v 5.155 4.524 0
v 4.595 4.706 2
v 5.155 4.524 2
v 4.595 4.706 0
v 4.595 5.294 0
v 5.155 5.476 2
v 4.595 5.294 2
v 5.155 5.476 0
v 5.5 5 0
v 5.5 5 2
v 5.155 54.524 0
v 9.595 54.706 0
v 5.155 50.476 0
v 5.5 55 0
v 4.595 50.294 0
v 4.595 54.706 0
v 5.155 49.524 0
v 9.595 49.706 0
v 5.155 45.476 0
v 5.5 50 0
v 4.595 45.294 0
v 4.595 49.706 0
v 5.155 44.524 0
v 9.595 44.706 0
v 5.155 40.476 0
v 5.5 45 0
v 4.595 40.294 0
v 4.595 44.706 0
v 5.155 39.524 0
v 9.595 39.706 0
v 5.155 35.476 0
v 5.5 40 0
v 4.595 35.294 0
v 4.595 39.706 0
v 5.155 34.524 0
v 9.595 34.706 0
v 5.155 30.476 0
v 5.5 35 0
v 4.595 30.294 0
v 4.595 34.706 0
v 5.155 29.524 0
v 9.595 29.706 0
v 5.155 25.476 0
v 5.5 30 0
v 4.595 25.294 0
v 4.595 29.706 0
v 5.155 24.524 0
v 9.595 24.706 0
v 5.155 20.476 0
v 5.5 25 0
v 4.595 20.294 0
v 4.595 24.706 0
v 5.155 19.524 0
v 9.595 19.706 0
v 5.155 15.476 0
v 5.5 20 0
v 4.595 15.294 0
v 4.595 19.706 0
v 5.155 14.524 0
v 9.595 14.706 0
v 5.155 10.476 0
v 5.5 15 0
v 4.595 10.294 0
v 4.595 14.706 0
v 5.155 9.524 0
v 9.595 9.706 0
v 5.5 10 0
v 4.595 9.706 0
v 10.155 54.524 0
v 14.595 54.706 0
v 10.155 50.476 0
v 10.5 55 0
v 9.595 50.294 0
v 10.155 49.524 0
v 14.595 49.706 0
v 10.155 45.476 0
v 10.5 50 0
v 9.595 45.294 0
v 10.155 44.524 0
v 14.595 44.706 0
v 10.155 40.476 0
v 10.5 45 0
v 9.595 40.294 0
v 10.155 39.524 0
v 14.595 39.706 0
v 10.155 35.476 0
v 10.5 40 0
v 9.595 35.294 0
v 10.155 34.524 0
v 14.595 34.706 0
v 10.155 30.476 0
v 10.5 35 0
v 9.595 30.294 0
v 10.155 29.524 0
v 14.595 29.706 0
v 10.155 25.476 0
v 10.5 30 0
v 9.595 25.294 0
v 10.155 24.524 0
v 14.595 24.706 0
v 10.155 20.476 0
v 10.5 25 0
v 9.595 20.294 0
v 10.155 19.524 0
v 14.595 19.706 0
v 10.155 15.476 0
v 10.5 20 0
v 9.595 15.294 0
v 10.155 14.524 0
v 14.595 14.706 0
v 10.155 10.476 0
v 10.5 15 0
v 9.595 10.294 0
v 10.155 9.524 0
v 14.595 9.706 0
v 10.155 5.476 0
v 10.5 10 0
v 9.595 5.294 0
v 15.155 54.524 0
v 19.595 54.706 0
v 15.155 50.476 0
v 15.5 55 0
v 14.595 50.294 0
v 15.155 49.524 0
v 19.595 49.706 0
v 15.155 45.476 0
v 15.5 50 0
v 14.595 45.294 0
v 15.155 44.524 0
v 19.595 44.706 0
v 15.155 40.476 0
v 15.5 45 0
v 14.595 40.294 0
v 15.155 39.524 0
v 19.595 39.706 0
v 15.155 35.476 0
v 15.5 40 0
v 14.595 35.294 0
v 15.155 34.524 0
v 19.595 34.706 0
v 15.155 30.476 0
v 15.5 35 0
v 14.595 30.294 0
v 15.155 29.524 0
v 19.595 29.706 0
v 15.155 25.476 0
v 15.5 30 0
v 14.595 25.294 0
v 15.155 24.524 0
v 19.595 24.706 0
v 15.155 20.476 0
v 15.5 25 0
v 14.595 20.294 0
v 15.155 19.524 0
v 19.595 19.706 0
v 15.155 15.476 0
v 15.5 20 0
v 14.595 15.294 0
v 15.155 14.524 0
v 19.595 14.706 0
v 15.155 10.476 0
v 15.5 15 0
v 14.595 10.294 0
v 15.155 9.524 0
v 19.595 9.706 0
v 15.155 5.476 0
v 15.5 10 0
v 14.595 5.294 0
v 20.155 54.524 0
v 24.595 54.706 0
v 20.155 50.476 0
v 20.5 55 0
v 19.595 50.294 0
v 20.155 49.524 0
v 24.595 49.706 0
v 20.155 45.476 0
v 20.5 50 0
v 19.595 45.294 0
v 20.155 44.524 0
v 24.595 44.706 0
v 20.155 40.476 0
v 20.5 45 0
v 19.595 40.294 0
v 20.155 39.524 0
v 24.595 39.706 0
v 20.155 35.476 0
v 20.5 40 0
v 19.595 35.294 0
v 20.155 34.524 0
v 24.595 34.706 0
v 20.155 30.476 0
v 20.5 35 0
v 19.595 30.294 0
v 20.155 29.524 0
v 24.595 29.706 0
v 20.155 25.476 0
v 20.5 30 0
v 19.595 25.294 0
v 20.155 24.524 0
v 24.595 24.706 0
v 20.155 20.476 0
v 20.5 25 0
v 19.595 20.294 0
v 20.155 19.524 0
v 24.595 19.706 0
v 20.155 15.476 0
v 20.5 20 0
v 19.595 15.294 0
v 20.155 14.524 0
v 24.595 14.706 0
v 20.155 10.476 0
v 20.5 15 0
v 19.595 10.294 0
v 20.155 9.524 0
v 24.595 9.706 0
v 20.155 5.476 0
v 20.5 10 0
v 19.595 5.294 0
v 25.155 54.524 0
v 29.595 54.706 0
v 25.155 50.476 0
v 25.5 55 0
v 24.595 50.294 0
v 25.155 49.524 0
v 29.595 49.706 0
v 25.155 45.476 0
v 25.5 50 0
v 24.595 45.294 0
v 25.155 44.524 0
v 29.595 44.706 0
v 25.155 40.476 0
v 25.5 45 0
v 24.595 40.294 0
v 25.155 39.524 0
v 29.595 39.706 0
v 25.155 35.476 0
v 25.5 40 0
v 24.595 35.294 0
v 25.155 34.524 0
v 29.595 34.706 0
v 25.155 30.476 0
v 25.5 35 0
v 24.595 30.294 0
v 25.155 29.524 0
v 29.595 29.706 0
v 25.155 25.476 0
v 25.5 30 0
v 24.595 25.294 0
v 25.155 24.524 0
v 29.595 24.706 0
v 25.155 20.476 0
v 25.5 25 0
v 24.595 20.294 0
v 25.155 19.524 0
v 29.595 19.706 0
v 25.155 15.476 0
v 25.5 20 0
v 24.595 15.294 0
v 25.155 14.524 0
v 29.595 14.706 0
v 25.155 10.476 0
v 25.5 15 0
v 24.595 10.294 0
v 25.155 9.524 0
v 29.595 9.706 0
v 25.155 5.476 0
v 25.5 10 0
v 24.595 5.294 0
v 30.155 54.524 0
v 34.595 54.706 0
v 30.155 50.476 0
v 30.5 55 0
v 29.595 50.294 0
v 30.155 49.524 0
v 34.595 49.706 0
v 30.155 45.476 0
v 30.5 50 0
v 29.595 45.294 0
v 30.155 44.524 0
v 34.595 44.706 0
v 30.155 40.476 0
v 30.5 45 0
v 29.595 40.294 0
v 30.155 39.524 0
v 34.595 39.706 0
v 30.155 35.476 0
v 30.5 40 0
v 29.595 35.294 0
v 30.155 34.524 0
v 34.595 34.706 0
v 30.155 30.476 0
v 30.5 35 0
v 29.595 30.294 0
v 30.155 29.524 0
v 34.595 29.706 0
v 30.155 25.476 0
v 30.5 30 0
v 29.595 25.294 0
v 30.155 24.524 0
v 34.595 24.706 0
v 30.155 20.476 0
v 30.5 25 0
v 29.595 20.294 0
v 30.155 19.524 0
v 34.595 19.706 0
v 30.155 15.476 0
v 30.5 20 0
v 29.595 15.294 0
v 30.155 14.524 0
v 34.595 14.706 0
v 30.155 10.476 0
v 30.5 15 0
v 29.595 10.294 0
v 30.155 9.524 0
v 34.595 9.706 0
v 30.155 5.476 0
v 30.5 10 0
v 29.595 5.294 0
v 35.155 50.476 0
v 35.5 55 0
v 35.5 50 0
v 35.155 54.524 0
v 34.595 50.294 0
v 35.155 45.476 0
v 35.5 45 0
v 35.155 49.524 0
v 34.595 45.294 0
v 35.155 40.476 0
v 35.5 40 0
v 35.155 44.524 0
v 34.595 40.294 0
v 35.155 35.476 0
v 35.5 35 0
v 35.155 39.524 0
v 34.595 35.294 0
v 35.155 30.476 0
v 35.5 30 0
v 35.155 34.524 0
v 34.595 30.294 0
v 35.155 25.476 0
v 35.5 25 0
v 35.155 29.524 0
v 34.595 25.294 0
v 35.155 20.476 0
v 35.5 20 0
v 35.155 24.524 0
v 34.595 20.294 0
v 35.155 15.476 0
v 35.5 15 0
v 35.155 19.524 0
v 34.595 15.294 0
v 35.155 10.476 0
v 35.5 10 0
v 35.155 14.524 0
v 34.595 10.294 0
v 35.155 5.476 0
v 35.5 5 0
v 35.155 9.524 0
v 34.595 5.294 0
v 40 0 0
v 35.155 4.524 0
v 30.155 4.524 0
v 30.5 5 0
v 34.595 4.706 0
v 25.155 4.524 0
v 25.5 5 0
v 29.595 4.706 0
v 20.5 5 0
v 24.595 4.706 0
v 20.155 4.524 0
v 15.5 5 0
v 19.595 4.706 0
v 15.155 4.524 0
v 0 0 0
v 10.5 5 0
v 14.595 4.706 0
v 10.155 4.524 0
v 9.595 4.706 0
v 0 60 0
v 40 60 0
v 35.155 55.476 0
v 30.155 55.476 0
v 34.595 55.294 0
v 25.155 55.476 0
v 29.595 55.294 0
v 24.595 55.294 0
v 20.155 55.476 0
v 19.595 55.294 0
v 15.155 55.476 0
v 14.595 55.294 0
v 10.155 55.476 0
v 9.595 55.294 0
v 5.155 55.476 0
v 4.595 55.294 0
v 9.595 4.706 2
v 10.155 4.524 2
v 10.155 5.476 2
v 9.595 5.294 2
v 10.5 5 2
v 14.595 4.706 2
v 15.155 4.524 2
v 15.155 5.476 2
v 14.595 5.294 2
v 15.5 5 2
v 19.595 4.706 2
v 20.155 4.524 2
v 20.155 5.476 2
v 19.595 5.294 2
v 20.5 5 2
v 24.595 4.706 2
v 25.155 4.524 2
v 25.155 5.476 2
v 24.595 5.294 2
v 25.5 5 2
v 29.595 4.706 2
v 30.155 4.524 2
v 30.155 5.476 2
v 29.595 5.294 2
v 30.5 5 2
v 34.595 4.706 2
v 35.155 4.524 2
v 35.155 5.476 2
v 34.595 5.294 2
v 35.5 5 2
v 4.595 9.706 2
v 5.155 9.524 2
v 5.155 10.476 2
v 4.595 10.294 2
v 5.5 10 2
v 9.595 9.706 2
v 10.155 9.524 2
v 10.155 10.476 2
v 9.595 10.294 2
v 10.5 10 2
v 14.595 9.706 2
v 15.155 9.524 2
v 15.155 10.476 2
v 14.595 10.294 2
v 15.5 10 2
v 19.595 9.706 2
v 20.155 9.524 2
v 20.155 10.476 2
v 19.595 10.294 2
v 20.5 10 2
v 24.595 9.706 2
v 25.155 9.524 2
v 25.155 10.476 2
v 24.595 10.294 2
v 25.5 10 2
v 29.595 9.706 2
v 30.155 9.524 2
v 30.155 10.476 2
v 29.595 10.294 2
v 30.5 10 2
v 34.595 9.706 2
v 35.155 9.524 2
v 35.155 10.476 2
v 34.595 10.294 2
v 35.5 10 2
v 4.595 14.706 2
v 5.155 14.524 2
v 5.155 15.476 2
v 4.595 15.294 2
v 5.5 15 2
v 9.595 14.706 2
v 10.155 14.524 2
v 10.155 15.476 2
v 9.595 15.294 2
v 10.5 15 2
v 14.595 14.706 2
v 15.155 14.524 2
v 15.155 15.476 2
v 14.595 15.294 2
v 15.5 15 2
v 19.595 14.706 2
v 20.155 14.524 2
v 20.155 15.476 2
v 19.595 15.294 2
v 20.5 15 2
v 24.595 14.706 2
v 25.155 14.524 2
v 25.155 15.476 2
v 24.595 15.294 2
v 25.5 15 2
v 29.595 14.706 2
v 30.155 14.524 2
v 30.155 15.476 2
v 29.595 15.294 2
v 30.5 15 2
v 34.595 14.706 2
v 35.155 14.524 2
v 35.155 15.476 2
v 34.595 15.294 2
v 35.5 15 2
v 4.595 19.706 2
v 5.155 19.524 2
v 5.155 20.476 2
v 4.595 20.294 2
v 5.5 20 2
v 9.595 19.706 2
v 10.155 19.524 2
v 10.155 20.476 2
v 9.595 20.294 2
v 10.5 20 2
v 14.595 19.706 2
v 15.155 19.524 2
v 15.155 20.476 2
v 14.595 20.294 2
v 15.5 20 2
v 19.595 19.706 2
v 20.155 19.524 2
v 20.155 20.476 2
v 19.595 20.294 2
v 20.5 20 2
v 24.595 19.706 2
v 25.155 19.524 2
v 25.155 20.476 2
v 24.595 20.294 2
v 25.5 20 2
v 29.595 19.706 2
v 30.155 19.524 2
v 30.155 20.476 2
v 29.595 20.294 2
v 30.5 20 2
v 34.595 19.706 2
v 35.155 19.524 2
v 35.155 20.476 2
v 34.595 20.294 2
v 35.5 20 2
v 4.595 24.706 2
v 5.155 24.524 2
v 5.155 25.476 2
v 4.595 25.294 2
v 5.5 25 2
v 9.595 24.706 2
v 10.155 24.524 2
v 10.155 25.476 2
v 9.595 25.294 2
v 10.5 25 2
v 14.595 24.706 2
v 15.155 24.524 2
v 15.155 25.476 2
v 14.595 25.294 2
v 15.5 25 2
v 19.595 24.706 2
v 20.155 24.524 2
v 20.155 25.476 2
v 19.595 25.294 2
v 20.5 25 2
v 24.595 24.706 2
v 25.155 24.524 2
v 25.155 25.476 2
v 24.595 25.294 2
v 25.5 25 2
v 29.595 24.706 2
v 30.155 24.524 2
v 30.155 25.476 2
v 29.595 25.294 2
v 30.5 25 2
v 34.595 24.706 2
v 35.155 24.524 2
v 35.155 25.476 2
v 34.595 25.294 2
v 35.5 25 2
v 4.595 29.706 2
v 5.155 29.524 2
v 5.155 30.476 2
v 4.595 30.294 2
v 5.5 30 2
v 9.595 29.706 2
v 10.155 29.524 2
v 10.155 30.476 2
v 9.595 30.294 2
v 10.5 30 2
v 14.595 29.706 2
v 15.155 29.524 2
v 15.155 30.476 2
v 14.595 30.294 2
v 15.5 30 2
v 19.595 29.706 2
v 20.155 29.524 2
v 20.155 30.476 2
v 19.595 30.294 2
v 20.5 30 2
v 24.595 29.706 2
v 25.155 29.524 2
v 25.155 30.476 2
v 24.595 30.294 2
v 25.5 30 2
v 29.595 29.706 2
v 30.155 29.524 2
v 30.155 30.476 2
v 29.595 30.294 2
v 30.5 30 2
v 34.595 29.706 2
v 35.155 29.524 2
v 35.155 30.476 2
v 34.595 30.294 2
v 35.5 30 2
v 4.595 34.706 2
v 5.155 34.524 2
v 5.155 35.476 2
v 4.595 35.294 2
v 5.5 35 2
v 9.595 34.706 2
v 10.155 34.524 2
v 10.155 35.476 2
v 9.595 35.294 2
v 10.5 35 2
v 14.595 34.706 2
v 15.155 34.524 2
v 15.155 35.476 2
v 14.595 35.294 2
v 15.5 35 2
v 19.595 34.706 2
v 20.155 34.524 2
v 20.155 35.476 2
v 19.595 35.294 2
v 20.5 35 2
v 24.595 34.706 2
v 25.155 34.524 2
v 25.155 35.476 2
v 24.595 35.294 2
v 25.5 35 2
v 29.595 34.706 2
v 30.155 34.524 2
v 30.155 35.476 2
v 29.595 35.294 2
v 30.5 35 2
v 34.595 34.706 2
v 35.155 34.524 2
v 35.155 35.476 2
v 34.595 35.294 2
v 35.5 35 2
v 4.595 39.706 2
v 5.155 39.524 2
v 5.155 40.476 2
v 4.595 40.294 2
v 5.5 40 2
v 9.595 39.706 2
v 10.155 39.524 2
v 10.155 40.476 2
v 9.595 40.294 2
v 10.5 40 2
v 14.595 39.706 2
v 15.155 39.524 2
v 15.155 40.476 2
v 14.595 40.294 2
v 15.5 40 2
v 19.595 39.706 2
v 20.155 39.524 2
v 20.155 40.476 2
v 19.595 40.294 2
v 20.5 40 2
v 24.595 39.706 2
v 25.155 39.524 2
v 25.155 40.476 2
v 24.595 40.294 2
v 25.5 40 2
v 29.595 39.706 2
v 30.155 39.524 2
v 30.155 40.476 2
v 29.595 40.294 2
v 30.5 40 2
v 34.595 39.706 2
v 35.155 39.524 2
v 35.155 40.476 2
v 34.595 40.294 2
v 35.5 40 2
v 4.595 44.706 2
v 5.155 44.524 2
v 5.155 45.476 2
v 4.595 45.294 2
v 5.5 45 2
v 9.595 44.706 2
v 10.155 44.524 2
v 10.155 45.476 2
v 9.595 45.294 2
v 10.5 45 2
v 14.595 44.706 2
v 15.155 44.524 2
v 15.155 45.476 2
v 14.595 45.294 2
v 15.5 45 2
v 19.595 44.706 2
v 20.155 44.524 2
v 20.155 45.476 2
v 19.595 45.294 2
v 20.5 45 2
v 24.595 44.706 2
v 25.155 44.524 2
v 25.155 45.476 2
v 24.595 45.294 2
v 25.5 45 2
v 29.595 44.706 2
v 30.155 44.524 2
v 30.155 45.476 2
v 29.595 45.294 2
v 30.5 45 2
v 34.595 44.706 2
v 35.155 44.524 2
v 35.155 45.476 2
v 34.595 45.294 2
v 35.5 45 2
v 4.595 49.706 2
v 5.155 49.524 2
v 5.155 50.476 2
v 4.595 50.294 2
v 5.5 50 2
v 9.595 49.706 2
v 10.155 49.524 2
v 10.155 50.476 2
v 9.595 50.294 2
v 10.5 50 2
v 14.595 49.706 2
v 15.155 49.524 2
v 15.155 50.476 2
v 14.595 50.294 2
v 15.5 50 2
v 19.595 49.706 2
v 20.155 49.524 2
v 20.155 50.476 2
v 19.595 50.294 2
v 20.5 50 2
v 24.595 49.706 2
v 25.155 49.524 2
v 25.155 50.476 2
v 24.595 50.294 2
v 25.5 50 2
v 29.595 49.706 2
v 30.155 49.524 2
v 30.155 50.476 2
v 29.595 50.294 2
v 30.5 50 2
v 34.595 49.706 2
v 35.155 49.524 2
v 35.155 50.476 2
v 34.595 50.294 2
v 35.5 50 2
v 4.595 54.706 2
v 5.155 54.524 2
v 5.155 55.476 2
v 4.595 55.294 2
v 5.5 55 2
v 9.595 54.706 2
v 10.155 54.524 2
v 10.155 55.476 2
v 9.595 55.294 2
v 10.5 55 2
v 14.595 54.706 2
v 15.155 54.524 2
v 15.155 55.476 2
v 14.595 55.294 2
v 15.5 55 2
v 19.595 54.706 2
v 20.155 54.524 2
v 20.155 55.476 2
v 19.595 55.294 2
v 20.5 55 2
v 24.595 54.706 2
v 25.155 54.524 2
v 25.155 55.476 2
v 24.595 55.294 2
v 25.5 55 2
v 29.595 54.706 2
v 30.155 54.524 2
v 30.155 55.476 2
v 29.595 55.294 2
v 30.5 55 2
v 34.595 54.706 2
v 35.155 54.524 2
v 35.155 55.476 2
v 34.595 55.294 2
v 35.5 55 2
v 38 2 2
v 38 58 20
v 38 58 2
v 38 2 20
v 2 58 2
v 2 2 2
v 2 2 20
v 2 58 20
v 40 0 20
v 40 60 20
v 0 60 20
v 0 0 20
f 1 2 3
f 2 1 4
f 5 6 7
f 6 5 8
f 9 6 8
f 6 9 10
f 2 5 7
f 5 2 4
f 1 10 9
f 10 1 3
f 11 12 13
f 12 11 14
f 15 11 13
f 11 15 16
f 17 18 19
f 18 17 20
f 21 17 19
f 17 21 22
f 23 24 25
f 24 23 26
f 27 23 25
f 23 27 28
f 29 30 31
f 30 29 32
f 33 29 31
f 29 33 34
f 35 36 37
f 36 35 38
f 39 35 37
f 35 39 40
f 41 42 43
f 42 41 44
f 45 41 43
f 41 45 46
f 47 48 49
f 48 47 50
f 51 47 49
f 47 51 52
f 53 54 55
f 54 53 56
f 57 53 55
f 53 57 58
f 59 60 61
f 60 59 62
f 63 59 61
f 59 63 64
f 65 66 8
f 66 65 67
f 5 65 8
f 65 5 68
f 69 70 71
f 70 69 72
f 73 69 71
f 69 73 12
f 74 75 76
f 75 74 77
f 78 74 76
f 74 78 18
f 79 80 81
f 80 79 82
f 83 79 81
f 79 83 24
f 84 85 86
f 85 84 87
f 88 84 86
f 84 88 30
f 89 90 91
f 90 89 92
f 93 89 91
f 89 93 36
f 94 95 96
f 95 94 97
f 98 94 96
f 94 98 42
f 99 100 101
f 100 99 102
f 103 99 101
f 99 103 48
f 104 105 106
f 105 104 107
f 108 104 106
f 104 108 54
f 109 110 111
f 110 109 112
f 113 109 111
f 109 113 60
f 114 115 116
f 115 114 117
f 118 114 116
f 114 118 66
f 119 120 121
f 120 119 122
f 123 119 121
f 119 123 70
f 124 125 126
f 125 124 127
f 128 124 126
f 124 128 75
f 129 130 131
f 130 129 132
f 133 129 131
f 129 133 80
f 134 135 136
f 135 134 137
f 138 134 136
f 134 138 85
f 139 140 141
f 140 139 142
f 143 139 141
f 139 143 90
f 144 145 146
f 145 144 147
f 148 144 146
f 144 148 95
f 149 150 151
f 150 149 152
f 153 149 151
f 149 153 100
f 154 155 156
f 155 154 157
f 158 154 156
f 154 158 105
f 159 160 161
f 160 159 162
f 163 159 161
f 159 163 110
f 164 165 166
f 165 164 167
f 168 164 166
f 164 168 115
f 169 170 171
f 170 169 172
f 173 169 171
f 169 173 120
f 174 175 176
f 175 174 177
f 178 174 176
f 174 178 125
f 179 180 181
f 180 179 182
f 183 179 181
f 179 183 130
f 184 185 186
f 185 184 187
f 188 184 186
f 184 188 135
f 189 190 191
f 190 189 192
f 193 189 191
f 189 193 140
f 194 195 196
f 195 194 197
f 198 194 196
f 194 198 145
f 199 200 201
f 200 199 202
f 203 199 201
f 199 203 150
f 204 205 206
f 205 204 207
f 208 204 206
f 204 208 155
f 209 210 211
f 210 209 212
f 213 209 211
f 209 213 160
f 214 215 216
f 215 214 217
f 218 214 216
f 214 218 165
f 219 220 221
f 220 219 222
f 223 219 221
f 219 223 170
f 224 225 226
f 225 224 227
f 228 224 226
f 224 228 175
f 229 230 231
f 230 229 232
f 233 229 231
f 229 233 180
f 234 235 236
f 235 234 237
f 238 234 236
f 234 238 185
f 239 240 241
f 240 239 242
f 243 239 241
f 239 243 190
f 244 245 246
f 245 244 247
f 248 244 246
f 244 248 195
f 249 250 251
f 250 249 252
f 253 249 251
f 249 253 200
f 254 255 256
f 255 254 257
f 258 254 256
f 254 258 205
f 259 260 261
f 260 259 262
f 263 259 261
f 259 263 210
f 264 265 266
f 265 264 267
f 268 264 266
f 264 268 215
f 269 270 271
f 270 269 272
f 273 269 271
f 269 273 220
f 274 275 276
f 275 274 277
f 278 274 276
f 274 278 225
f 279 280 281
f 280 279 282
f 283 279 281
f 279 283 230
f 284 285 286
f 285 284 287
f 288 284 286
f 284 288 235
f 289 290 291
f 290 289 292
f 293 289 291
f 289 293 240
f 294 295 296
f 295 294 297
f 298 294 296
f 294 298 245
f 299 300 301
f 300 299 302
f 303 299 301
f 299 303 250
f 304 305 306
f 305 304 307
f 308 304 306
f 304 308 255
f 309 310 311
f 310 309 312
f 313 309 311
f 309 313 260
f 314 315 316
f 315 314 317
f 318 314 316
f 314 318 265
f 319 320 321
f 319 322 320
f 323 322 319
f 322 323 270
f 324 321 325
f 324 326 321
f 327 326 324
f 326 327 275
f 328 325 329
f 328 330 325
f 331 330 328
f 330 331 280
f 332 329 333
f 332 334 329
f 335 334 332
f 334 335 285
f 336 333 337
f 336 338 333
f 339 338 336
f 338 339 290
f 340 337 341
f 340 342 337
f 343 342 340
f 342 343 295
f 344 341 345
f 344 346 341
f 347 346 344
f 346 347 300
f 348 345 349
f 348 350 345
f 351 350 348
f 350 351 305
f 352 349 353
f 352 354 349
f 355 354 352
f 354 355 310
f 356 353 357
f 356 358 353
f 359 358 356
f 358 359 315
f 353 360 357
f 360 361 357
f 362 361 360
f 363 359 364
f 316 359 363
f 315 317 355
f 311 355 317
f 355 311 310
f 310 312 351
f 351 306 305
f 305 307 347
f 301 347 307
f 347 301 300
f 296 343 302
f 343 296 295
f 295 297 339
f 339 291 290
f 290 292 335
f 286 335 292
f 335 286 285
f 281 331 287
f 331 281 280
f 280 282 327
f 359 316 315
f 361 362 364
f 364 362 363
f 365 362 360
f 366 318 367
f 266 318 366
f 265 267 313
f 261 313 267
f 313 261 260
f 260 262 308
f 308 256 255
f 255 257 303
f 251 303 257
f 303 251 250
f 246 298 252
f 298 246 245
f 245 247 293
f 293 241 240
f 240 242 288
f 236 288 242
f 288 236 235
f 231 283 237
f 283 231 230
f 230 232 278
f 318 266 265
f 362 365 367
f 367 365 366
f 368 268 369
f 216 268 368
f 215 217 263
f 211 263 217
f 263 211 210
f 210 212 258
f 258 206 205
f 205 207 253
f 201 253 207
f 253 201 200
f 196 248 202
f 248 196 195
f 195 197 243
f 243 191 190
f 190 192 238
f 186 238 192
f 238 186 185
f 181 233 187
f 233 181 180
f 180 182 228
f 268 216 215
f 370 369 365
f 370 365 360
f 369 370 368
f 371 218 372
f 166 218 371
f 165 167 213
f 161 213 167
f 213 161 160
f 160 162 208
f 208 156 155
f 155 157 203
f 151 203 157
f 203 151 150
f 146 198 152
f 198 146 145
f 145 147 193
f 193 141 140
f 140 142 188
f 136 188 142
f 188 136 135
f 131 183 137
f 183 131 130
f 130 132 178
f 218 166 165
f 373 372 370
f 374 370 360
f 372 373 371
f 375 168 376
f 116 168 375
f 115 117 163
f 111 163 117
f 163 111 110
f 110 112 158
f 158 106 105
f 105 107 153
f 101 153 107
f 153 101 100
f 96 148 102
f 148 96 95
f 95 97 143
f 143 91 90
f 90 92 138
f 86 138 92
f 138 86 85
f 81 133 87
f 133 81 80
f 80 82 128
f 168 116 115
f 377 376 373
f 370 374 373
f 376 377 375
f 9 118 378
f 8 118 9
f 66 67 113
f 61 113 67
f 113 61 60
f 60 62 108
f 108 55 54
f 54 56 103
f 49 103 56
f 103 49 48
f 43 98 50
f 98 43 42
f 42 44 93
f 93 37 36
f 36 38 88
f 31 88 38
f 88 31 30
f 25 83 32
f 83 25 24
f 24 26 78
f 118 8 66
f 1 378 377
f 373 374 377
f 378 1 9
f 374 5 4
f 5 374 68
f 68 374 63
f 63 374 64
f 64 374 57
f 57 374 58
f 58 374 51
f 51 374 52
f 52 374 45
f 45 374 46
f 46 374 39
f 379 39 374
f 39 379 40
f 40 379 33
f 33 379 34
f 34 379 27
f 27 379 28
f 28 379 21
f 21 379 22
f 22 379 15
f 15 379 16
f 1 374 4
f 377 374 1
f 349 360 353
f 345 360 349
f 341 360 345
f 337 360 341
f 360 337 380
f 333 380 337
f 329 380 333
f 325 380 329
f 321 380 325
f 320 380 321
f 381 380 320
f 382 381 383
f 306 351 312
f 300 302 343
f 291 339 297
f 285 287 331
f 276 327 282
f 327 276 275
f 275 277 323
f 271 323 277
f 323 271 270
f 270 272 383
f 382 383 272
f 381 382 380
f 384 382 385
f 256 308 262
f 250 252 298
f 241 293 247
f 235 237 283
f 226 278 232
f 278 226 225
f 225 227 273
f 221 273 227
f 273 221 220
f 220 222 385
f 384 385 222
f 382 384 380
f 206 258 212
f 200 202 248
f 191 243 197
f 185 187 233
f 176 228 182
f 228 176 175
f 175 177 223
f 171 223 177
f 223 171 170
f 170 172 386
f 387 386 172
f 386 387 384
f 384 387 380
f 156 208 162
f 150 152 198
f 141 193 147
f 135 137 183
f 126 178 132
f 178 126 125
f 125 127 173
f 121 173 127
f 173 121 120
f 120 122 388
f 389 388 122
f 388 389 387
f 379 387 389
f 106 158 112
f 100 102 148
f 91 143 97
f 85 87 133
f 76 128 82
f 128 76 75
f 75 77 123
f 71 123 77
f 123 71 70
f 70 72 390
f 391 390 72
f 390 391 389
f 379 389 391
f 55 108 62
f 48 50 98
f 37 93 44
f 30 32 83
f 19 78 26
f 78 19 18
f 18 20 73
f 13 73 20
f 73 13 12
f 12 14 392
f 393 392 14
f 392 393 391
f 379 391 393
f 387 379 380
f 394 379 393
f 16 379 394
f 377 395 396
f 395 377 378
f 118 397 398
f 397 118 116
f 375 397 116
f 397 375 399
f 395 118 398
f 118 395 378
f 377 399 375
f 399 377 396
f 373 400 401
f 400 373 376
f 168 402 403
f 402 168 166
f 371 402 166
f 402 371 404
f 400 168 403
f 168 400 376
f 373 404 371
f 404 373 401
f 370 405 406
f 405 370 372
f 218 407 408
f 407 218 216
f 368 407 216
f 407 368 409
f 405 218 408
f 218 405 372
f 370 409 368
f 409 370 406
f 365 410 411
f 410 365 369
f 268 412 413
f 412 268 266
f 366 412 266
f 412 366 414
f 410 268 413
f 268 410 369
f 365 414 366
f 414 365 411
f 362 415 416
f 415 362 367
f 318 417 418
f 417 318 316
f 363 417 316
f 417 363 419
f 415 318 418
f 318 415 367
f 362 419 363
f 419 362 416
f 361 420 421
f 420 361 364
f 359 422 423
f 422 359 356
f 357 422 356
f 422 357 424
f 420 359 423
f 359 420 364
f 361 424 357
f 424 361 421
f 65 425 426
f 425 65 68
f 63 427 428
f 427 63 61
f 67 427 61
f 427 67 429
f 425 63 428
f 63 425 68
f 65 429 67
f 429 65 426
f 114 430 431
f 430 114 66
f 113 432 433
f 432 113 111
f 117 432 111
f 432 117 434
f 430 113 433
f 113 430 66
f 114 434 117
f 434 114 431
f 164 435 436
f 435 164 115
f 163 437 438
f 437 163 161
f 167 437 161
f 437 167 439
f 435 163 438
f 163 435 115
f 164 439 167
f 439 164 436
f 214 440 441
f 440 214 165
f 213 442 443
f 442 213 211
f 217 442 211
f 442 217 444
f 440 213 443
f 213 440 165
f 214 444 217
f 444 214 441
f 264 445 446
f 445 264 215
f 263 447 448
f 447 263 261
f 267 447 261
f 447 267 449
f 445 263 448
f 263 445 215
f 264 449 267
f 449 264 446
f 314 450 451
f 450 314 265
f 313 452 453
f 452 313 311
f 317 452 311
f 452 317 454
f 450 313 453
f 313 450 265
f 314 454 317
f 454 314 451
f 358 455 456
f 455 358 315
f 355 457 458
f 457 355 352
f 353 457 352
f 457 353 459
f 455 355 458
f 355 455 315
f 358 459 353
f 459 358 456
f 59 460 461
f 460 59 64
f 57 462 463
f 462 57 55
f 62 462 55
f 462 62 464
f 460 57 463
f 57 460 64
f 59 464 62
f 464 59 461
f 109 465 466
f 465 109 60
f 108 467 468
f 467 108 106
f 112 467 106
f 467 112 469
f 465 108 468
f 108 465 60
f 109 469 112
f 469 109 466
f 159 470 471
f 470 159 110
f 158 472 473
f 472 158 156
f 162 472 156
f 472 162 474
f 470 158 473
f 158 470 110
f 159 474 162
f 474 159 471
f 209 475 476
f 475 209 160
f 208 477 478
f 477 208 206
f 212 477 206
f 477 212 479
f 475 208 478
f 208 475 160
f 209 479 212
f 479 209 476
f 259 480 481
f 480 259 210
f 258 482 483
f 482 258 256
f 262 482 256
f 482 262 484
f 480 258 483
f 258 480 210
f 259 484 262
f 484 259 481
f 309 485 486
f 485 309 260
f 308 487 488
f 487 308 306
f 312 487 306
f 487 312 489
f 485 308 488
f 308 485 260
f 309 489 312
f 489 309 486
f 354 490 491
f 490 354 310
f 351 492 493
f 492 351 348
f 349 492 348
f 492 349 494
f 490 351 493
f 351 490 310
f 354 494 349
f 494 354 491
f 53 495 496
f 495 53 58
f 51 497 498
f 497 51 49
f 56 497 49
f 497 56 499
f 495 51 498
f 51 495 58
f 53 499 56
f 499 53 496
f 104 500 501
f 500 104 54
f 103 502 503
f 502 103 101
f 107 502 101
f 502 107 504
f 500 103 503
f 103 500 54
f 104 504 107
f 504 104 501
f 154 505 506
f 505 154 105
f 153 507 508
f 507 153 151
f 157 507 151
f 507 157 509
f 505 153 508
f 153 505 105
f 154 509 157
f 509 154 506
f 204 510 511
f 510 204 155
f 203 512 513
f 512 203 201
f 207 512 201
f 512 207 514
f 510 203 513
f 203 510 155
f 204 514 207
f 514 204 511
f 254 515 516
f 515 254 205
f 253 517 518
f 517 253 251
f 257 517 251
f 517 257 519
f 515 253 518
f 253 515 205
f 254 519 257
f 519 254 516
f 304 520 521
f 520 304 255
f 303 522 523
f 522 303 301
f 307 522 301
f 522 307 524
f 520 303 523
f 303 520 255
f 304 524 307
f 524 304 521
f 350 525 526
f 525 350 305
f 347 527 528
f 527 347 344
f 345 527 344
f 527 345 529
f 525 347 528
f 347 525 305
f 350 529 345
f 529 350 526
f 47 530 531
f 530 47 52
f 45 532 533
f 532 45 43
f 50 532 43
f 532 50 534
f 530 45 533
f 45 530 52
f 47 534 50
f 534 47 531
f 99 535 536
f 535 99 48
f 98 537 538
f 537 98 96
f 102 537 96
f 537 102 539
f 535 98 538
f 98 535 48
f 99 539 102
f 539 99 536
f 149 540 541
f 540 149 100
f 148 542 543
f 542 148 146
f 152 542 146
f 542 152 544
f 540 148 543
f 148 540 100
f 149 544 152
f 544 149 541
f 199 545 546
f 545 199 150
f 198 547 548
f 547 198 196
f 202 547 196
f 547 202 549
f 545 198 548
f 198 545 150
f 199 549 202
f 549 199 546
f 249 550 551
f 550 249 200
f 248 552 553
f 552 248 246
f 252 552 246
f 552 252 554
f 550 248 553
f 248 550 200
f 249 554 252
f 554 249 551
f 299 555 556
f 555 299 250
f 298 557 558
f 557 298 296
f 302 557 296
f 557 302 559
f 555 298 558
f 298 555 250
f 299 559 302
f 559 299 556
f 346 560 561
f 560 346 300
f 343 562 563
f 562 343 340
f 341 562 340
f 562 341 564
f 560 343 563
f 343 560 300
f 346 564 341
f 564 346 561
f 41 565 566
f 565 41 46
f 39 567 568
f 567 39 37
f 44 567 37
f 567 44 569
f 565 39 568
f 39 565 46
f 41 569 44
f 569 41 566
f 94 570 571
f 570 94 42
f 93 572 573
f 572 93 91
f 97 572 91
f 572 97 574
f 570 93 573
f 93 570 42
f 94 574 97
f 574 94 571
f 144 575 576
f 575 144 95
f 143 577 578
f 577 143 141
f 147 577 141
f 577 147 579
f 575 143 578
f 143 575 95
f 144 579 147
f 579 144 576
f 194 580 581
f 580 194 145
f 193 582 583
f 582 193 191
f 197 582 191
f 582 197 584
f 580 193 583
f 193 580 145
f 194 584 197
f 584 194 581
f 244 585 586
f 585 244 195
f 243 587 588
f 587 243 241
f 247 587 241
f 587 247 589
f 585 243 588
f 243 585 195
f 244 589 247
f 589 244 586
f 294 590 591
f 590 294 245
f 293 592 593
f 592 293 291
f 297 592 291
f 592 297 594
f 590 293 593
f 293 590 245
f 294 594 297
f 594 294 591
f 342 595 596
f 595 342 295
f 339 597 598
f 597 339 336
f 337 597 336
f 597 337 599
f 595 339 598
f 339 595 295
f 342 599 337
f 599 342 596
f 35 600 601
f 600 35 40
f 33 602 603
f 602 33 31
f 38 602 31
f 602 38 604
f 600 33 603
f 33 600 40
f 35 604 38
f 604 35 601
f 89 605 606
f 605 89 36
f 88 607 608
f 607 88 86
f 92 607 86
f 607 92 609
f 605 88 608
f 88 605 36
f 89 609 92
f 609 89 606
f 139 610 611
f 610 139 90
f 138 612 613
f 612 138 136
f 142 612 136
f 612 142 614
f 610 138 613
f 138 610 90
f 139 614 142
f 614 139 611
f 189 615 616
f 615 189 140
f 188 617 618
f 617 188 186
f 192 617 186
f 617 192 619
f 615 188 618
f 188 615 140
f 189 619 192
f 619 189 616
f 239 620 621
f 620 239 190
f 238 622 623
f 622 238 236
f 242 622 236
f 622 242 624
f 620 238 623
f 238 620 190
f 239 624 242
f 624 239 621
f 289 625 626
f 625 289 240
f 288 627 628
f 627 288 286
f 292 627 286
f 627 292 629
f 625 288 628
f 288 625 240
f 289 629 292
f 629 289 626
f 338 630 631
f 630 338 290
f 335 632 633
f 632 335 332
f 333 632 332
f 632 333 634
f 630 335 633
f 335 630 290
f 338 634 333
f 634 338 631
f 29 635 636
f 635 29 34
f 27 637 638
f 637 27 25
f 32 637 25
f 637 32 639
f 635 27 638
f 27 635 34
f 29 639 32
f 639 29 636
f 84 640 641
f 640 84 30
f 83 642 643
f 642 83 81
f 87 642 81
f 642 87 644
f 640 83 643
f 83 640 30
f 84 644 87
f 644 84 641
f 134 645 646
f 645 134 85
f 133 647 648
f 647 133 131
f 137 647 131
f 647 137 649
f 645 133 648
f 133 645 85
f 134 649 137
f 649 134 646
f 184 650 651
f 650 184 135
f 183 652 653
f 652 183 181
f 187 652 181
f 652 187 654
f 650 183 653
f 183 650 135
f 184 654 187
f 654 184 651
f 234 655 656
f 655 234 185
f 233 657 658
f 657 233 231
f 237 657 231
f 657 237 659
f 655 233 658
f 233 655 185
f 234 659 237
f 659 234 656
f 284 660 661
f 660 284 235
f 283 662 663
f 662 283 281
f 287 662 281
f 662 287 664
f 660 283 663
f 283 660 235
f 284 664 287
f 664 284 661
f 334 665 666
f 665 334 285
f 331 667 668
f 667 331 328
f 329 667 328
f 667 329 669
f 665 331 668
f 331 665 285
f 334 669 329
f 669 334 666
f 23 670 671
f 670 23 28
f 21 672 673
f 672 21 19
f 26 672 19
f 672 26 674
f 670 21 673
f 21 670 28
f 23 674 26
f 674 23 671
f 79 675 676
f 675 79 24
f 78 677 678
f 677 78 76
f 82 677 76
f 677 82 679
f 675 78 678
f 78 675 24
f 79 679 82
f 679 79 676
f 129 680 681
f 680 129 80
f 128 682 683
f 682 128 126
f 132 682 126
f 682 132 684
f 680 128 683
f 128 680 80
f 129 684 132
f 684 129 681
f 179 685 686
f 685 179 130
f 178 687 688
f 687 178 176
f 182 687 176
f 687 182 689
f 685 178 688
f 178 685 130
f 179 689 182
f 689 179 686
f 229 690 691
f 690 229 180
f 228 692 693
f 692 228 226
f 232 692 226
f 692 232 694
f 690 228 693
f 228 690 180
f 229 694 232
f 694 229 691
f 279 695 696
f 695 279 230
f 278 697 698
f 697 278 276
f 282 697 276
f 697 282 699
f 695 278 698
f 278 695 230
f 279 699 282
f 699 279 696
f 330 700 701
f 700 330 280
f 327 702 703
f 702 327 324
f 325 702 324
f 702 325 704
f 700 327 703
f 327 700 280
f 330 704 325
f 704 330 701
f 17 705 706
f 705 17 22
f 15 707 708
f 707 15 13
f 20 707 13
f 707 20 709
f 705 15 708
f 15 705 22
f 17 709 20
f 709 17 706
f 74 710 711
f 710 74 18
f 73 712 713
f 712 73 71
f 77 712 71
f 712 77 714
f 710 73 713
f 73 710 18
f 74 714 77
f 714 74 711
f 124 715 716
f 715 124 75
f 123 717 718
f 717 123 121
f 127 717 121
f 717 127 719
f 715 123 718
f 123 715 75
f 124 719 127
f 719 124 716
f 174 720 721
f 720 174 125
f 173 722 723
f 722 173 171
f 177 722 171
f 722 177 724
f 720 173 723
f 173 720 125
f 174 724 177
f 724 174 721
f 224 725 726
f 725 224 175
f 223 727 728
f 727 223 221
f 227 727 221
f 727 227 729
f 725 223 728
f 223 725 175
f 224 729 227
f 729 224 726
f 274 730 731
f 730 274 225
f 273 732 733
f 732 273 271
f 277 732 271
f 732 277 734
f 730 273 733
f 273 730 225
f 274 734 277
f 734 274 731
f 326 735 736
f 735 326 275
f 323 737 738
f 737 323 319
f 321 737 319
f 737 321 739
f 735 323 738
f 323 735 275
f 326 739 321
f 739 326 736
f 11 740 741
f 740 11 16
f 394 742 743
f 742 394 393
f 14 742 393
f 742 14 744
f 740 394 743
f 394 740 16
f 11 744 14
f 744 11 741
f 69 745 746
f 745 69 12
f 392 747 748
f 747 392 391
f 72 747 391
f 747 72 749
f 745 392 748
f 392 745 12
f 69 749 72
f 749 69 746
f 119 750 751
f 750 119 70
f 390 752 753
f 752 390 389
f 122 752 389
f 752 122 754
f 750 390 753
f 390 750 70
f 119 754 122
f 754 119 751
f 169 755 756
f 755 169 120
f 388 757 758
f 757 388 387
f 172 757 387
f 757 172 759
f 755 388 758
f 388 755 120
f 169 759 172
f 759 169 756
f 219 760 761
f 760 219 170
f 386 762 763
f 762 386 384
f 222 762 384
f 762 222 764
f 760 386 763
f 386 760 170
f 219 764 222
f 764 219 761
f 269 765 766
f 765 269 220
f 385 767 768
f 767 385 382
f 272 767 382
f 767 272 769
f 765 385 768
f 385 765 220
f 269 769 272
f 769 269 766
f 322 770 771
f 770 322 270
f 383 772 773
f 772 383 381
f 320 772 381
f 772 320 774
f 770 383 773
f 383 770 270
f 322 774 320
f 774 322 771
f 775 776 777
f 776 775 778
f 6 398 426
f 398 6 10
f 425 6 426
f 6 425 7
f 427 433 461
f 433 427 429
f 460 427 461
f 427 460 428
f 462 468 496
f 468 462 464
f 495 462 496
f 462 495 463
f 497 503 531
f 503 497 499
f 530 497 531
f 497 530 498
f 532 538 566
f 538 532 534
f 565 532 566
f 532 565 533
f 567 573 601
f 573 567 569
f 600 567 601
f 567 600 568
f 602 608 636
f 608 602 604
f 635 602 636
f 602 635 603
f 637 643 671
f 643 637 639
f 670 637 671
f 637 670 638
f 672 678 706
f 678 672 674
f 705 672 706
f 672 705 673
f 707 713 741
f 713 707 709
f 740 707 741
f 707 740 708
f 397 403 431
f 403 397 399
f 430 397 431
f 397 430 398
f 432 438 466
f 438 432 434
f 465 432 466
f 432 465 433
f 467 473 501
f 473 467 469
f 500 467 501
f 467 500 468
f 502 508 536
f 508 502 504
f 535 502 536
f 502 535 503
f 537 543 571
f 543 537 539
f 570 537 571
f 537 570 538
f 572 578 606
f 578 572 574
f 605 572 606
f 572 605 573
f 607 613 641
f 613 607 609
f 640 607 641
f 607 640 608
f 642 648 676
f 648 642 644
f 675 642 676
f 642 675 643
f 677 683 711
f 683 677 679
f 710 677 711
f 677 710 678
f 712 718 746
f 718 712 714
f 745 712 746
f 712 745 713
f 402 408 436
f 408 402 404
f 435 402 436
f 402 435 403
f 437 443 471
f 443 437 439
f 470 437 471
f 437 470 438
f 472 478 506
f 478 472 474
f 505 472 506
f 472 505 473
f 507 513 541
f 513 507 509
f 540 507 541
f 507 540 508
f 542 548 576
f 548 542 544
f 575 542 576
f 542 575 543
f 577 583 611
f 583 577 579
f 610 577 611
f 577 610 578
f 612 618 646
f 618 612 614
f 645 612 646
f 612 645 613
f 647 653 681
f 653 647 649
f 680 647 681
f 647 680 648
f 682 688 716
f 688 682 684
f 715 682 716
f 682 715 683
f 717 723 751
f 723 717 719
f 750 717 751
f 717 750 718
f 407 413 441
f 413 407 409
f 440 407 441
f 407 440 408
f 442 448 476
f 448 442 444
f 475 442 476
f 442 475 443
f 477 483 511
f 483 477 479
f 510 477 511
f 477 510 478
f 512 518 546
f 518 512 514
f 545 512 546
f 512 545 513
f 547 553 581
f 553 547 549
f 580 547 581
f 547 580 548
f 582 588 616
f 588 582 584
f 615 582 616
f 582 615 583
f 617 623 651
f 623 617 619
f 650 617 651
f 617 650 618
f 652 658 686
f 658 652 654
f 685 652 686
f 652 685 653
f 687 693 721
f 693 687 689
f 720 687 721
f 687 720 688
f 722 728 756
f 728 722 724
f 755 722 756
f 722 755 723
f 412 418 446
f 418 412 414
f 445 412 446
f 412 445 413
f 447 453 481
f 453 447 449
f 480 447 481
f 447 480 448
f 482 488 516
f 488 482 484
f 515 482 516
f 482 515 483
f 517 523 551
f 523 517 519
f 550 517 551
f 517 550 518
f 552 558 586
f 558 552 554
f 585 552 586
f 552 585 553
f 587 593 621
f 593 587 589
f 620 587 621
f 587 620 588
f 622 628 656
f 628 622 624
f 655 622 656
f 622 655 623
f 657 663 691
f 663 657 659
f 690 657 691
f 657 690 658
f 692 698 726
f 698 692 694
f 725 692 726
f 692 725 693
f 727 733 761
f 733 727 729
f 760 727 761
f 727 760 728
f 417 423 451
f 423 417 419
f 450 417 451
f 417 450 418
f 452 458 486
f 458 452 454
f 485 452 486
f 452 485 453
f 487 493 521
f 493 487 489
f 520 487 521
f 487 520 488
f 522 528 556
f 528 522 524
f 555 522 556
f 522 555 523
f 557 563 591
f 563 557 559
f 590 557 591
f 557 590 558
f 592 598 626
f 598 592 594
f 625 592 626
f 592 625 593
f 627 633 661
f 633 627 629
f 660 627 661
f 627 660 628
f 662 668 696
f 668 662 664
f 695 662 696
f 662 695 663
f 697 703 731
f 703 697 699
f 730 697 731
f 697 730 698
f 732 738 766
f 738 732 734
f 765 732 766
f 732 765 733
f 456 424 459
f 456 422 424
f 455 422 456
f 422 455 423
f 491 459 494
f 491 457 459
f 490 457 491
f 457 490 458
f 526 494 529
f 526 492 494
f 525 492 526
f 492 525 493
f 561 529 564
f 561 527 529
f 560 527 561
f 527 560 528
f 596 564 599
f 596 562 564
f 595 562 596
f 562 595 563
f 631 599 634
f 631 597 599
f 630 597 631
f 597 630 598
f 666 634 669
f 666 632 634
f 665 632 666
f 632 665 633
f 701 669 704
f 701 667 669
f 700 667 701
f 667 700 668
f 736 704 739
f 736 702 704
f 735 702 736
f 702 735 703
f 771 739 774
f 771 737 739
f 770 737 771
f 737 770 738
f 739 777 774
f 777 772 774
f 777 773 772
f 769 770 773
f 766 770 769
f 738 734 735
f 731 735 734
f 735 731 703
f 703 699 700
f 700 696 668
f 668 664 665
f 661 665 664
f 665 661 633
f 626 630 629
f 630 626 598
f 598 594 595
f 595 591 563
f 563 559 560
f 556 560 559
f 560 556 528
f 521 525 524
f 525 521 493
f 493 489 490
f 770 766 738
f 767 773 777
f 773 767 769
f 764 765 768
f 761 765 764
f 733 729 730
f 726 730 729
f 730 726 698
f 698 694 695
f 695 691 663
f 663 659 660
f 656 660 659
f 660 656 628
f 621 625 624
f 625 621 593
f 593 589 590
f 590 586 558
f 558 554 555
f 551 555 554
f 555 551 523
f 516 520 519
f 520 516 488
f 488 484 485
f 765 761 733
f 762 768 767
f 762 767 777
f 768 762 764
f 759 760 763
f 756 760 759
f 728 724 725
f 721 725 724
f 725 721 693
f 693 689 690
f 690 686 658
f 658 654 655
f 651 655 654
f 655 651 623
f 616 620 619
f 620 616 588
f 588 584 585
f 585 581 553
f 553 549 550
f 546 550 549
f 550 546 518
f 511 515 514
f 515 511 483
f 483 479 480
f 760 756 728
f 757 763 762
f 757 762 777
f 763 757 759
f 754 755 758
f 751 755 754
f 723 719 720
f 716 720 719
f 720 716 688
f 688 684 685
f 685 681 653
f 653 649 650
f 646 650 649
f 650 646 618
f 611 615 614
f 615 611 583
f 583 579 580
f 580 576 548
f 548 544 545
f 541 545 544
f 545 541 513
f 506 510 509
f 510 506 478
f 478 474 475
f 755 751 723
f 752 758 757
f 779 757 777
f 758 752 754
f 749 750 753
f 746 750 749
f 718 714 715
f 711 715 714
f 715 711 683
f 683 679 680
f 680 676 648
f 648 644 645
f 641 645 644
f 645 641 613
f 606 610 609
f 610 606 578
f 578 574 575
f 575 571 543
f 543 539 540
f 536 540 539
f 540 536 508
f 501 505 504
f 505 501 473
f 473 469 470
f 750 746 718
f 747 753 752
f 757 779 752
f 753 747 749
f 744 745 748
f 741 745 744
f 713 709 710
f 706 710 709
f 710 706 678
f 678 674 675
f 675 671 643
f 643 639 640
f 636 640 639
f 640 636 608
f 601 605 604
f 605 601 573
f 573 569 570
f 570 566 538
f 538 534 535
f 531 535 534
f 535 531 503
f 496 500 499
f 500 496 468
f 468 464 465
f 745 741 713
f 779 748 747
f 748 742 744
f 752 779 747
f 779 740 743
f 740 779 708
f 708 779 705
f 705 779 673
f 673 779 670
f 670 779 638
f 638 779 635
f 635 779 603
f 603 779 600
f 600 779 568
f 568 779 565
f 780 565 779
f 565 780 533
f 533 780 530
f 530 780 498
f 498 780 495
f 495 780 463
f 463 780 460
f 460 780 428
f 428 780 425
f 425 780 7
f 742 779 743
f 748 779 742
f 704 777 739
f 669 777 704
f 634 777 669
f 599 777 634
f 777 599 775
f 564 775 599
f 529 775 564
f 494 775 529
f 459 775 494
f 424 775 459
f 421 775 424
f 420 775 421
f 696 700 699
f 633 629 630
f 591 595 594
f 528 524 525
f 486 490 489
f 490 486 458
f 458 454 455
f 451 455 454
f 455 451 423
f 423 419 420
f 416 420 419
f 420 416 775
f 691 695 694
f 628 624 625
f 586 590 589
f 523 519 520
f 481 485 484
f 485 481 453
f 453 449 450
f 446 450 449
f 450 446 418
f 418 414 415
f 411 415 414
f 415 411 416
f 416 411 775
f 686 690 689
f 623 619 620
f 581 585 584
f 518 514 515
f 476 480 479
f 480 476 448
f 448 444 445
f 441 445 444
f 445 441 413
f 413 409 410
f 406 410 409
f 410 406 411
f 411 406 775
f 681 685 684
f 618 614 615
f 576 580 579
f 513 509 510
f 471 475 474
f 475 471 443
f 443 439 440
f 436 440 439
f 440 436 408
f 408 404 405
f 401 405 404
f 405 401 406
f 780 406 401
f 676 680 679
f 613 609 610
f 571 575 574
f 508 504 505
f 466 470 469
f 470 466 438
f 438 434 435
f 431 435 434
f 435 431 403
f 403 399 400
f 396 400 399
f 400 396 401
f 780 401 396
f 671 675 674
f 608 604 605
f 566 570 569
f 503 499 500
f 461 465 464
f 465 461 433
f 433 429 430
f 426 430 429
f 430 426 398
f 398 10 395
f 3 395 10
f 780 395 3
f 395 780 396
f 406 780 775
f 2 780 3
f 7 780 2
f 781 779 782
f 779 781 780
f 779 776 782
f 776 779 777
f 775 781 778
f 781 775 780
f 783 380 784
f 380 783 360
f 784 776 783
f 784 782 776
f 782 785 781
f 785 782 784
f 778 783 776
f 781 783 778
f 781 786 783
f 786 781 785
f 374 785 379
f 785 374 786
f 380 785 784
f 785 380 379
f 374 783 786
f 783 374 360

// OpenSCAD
//width (in mm)
width = 40;

//length
length = 60;

//height
height = 20;

//wall thickness
wall = 2;

//pitch (hole spacing)
pitch = 5;

module pbox(w,l,h,wall,pitch){
    difference(){
        cube([w,l,h]);
        union(){
            translate([wall,wall,wall]) cube([w-2*wall,l-2*wall,h]);
            for (f=[0:l/pitch-2]){
                for (i=[0:w/pitch-2]){
                    translate([pitch*i+pitch,pitch*f+pitch,0]) cylinder(r=0.5,h=2*wall);
                }
            }
        }
    } 
}

pbox(width,length,height,wall,pitch);
